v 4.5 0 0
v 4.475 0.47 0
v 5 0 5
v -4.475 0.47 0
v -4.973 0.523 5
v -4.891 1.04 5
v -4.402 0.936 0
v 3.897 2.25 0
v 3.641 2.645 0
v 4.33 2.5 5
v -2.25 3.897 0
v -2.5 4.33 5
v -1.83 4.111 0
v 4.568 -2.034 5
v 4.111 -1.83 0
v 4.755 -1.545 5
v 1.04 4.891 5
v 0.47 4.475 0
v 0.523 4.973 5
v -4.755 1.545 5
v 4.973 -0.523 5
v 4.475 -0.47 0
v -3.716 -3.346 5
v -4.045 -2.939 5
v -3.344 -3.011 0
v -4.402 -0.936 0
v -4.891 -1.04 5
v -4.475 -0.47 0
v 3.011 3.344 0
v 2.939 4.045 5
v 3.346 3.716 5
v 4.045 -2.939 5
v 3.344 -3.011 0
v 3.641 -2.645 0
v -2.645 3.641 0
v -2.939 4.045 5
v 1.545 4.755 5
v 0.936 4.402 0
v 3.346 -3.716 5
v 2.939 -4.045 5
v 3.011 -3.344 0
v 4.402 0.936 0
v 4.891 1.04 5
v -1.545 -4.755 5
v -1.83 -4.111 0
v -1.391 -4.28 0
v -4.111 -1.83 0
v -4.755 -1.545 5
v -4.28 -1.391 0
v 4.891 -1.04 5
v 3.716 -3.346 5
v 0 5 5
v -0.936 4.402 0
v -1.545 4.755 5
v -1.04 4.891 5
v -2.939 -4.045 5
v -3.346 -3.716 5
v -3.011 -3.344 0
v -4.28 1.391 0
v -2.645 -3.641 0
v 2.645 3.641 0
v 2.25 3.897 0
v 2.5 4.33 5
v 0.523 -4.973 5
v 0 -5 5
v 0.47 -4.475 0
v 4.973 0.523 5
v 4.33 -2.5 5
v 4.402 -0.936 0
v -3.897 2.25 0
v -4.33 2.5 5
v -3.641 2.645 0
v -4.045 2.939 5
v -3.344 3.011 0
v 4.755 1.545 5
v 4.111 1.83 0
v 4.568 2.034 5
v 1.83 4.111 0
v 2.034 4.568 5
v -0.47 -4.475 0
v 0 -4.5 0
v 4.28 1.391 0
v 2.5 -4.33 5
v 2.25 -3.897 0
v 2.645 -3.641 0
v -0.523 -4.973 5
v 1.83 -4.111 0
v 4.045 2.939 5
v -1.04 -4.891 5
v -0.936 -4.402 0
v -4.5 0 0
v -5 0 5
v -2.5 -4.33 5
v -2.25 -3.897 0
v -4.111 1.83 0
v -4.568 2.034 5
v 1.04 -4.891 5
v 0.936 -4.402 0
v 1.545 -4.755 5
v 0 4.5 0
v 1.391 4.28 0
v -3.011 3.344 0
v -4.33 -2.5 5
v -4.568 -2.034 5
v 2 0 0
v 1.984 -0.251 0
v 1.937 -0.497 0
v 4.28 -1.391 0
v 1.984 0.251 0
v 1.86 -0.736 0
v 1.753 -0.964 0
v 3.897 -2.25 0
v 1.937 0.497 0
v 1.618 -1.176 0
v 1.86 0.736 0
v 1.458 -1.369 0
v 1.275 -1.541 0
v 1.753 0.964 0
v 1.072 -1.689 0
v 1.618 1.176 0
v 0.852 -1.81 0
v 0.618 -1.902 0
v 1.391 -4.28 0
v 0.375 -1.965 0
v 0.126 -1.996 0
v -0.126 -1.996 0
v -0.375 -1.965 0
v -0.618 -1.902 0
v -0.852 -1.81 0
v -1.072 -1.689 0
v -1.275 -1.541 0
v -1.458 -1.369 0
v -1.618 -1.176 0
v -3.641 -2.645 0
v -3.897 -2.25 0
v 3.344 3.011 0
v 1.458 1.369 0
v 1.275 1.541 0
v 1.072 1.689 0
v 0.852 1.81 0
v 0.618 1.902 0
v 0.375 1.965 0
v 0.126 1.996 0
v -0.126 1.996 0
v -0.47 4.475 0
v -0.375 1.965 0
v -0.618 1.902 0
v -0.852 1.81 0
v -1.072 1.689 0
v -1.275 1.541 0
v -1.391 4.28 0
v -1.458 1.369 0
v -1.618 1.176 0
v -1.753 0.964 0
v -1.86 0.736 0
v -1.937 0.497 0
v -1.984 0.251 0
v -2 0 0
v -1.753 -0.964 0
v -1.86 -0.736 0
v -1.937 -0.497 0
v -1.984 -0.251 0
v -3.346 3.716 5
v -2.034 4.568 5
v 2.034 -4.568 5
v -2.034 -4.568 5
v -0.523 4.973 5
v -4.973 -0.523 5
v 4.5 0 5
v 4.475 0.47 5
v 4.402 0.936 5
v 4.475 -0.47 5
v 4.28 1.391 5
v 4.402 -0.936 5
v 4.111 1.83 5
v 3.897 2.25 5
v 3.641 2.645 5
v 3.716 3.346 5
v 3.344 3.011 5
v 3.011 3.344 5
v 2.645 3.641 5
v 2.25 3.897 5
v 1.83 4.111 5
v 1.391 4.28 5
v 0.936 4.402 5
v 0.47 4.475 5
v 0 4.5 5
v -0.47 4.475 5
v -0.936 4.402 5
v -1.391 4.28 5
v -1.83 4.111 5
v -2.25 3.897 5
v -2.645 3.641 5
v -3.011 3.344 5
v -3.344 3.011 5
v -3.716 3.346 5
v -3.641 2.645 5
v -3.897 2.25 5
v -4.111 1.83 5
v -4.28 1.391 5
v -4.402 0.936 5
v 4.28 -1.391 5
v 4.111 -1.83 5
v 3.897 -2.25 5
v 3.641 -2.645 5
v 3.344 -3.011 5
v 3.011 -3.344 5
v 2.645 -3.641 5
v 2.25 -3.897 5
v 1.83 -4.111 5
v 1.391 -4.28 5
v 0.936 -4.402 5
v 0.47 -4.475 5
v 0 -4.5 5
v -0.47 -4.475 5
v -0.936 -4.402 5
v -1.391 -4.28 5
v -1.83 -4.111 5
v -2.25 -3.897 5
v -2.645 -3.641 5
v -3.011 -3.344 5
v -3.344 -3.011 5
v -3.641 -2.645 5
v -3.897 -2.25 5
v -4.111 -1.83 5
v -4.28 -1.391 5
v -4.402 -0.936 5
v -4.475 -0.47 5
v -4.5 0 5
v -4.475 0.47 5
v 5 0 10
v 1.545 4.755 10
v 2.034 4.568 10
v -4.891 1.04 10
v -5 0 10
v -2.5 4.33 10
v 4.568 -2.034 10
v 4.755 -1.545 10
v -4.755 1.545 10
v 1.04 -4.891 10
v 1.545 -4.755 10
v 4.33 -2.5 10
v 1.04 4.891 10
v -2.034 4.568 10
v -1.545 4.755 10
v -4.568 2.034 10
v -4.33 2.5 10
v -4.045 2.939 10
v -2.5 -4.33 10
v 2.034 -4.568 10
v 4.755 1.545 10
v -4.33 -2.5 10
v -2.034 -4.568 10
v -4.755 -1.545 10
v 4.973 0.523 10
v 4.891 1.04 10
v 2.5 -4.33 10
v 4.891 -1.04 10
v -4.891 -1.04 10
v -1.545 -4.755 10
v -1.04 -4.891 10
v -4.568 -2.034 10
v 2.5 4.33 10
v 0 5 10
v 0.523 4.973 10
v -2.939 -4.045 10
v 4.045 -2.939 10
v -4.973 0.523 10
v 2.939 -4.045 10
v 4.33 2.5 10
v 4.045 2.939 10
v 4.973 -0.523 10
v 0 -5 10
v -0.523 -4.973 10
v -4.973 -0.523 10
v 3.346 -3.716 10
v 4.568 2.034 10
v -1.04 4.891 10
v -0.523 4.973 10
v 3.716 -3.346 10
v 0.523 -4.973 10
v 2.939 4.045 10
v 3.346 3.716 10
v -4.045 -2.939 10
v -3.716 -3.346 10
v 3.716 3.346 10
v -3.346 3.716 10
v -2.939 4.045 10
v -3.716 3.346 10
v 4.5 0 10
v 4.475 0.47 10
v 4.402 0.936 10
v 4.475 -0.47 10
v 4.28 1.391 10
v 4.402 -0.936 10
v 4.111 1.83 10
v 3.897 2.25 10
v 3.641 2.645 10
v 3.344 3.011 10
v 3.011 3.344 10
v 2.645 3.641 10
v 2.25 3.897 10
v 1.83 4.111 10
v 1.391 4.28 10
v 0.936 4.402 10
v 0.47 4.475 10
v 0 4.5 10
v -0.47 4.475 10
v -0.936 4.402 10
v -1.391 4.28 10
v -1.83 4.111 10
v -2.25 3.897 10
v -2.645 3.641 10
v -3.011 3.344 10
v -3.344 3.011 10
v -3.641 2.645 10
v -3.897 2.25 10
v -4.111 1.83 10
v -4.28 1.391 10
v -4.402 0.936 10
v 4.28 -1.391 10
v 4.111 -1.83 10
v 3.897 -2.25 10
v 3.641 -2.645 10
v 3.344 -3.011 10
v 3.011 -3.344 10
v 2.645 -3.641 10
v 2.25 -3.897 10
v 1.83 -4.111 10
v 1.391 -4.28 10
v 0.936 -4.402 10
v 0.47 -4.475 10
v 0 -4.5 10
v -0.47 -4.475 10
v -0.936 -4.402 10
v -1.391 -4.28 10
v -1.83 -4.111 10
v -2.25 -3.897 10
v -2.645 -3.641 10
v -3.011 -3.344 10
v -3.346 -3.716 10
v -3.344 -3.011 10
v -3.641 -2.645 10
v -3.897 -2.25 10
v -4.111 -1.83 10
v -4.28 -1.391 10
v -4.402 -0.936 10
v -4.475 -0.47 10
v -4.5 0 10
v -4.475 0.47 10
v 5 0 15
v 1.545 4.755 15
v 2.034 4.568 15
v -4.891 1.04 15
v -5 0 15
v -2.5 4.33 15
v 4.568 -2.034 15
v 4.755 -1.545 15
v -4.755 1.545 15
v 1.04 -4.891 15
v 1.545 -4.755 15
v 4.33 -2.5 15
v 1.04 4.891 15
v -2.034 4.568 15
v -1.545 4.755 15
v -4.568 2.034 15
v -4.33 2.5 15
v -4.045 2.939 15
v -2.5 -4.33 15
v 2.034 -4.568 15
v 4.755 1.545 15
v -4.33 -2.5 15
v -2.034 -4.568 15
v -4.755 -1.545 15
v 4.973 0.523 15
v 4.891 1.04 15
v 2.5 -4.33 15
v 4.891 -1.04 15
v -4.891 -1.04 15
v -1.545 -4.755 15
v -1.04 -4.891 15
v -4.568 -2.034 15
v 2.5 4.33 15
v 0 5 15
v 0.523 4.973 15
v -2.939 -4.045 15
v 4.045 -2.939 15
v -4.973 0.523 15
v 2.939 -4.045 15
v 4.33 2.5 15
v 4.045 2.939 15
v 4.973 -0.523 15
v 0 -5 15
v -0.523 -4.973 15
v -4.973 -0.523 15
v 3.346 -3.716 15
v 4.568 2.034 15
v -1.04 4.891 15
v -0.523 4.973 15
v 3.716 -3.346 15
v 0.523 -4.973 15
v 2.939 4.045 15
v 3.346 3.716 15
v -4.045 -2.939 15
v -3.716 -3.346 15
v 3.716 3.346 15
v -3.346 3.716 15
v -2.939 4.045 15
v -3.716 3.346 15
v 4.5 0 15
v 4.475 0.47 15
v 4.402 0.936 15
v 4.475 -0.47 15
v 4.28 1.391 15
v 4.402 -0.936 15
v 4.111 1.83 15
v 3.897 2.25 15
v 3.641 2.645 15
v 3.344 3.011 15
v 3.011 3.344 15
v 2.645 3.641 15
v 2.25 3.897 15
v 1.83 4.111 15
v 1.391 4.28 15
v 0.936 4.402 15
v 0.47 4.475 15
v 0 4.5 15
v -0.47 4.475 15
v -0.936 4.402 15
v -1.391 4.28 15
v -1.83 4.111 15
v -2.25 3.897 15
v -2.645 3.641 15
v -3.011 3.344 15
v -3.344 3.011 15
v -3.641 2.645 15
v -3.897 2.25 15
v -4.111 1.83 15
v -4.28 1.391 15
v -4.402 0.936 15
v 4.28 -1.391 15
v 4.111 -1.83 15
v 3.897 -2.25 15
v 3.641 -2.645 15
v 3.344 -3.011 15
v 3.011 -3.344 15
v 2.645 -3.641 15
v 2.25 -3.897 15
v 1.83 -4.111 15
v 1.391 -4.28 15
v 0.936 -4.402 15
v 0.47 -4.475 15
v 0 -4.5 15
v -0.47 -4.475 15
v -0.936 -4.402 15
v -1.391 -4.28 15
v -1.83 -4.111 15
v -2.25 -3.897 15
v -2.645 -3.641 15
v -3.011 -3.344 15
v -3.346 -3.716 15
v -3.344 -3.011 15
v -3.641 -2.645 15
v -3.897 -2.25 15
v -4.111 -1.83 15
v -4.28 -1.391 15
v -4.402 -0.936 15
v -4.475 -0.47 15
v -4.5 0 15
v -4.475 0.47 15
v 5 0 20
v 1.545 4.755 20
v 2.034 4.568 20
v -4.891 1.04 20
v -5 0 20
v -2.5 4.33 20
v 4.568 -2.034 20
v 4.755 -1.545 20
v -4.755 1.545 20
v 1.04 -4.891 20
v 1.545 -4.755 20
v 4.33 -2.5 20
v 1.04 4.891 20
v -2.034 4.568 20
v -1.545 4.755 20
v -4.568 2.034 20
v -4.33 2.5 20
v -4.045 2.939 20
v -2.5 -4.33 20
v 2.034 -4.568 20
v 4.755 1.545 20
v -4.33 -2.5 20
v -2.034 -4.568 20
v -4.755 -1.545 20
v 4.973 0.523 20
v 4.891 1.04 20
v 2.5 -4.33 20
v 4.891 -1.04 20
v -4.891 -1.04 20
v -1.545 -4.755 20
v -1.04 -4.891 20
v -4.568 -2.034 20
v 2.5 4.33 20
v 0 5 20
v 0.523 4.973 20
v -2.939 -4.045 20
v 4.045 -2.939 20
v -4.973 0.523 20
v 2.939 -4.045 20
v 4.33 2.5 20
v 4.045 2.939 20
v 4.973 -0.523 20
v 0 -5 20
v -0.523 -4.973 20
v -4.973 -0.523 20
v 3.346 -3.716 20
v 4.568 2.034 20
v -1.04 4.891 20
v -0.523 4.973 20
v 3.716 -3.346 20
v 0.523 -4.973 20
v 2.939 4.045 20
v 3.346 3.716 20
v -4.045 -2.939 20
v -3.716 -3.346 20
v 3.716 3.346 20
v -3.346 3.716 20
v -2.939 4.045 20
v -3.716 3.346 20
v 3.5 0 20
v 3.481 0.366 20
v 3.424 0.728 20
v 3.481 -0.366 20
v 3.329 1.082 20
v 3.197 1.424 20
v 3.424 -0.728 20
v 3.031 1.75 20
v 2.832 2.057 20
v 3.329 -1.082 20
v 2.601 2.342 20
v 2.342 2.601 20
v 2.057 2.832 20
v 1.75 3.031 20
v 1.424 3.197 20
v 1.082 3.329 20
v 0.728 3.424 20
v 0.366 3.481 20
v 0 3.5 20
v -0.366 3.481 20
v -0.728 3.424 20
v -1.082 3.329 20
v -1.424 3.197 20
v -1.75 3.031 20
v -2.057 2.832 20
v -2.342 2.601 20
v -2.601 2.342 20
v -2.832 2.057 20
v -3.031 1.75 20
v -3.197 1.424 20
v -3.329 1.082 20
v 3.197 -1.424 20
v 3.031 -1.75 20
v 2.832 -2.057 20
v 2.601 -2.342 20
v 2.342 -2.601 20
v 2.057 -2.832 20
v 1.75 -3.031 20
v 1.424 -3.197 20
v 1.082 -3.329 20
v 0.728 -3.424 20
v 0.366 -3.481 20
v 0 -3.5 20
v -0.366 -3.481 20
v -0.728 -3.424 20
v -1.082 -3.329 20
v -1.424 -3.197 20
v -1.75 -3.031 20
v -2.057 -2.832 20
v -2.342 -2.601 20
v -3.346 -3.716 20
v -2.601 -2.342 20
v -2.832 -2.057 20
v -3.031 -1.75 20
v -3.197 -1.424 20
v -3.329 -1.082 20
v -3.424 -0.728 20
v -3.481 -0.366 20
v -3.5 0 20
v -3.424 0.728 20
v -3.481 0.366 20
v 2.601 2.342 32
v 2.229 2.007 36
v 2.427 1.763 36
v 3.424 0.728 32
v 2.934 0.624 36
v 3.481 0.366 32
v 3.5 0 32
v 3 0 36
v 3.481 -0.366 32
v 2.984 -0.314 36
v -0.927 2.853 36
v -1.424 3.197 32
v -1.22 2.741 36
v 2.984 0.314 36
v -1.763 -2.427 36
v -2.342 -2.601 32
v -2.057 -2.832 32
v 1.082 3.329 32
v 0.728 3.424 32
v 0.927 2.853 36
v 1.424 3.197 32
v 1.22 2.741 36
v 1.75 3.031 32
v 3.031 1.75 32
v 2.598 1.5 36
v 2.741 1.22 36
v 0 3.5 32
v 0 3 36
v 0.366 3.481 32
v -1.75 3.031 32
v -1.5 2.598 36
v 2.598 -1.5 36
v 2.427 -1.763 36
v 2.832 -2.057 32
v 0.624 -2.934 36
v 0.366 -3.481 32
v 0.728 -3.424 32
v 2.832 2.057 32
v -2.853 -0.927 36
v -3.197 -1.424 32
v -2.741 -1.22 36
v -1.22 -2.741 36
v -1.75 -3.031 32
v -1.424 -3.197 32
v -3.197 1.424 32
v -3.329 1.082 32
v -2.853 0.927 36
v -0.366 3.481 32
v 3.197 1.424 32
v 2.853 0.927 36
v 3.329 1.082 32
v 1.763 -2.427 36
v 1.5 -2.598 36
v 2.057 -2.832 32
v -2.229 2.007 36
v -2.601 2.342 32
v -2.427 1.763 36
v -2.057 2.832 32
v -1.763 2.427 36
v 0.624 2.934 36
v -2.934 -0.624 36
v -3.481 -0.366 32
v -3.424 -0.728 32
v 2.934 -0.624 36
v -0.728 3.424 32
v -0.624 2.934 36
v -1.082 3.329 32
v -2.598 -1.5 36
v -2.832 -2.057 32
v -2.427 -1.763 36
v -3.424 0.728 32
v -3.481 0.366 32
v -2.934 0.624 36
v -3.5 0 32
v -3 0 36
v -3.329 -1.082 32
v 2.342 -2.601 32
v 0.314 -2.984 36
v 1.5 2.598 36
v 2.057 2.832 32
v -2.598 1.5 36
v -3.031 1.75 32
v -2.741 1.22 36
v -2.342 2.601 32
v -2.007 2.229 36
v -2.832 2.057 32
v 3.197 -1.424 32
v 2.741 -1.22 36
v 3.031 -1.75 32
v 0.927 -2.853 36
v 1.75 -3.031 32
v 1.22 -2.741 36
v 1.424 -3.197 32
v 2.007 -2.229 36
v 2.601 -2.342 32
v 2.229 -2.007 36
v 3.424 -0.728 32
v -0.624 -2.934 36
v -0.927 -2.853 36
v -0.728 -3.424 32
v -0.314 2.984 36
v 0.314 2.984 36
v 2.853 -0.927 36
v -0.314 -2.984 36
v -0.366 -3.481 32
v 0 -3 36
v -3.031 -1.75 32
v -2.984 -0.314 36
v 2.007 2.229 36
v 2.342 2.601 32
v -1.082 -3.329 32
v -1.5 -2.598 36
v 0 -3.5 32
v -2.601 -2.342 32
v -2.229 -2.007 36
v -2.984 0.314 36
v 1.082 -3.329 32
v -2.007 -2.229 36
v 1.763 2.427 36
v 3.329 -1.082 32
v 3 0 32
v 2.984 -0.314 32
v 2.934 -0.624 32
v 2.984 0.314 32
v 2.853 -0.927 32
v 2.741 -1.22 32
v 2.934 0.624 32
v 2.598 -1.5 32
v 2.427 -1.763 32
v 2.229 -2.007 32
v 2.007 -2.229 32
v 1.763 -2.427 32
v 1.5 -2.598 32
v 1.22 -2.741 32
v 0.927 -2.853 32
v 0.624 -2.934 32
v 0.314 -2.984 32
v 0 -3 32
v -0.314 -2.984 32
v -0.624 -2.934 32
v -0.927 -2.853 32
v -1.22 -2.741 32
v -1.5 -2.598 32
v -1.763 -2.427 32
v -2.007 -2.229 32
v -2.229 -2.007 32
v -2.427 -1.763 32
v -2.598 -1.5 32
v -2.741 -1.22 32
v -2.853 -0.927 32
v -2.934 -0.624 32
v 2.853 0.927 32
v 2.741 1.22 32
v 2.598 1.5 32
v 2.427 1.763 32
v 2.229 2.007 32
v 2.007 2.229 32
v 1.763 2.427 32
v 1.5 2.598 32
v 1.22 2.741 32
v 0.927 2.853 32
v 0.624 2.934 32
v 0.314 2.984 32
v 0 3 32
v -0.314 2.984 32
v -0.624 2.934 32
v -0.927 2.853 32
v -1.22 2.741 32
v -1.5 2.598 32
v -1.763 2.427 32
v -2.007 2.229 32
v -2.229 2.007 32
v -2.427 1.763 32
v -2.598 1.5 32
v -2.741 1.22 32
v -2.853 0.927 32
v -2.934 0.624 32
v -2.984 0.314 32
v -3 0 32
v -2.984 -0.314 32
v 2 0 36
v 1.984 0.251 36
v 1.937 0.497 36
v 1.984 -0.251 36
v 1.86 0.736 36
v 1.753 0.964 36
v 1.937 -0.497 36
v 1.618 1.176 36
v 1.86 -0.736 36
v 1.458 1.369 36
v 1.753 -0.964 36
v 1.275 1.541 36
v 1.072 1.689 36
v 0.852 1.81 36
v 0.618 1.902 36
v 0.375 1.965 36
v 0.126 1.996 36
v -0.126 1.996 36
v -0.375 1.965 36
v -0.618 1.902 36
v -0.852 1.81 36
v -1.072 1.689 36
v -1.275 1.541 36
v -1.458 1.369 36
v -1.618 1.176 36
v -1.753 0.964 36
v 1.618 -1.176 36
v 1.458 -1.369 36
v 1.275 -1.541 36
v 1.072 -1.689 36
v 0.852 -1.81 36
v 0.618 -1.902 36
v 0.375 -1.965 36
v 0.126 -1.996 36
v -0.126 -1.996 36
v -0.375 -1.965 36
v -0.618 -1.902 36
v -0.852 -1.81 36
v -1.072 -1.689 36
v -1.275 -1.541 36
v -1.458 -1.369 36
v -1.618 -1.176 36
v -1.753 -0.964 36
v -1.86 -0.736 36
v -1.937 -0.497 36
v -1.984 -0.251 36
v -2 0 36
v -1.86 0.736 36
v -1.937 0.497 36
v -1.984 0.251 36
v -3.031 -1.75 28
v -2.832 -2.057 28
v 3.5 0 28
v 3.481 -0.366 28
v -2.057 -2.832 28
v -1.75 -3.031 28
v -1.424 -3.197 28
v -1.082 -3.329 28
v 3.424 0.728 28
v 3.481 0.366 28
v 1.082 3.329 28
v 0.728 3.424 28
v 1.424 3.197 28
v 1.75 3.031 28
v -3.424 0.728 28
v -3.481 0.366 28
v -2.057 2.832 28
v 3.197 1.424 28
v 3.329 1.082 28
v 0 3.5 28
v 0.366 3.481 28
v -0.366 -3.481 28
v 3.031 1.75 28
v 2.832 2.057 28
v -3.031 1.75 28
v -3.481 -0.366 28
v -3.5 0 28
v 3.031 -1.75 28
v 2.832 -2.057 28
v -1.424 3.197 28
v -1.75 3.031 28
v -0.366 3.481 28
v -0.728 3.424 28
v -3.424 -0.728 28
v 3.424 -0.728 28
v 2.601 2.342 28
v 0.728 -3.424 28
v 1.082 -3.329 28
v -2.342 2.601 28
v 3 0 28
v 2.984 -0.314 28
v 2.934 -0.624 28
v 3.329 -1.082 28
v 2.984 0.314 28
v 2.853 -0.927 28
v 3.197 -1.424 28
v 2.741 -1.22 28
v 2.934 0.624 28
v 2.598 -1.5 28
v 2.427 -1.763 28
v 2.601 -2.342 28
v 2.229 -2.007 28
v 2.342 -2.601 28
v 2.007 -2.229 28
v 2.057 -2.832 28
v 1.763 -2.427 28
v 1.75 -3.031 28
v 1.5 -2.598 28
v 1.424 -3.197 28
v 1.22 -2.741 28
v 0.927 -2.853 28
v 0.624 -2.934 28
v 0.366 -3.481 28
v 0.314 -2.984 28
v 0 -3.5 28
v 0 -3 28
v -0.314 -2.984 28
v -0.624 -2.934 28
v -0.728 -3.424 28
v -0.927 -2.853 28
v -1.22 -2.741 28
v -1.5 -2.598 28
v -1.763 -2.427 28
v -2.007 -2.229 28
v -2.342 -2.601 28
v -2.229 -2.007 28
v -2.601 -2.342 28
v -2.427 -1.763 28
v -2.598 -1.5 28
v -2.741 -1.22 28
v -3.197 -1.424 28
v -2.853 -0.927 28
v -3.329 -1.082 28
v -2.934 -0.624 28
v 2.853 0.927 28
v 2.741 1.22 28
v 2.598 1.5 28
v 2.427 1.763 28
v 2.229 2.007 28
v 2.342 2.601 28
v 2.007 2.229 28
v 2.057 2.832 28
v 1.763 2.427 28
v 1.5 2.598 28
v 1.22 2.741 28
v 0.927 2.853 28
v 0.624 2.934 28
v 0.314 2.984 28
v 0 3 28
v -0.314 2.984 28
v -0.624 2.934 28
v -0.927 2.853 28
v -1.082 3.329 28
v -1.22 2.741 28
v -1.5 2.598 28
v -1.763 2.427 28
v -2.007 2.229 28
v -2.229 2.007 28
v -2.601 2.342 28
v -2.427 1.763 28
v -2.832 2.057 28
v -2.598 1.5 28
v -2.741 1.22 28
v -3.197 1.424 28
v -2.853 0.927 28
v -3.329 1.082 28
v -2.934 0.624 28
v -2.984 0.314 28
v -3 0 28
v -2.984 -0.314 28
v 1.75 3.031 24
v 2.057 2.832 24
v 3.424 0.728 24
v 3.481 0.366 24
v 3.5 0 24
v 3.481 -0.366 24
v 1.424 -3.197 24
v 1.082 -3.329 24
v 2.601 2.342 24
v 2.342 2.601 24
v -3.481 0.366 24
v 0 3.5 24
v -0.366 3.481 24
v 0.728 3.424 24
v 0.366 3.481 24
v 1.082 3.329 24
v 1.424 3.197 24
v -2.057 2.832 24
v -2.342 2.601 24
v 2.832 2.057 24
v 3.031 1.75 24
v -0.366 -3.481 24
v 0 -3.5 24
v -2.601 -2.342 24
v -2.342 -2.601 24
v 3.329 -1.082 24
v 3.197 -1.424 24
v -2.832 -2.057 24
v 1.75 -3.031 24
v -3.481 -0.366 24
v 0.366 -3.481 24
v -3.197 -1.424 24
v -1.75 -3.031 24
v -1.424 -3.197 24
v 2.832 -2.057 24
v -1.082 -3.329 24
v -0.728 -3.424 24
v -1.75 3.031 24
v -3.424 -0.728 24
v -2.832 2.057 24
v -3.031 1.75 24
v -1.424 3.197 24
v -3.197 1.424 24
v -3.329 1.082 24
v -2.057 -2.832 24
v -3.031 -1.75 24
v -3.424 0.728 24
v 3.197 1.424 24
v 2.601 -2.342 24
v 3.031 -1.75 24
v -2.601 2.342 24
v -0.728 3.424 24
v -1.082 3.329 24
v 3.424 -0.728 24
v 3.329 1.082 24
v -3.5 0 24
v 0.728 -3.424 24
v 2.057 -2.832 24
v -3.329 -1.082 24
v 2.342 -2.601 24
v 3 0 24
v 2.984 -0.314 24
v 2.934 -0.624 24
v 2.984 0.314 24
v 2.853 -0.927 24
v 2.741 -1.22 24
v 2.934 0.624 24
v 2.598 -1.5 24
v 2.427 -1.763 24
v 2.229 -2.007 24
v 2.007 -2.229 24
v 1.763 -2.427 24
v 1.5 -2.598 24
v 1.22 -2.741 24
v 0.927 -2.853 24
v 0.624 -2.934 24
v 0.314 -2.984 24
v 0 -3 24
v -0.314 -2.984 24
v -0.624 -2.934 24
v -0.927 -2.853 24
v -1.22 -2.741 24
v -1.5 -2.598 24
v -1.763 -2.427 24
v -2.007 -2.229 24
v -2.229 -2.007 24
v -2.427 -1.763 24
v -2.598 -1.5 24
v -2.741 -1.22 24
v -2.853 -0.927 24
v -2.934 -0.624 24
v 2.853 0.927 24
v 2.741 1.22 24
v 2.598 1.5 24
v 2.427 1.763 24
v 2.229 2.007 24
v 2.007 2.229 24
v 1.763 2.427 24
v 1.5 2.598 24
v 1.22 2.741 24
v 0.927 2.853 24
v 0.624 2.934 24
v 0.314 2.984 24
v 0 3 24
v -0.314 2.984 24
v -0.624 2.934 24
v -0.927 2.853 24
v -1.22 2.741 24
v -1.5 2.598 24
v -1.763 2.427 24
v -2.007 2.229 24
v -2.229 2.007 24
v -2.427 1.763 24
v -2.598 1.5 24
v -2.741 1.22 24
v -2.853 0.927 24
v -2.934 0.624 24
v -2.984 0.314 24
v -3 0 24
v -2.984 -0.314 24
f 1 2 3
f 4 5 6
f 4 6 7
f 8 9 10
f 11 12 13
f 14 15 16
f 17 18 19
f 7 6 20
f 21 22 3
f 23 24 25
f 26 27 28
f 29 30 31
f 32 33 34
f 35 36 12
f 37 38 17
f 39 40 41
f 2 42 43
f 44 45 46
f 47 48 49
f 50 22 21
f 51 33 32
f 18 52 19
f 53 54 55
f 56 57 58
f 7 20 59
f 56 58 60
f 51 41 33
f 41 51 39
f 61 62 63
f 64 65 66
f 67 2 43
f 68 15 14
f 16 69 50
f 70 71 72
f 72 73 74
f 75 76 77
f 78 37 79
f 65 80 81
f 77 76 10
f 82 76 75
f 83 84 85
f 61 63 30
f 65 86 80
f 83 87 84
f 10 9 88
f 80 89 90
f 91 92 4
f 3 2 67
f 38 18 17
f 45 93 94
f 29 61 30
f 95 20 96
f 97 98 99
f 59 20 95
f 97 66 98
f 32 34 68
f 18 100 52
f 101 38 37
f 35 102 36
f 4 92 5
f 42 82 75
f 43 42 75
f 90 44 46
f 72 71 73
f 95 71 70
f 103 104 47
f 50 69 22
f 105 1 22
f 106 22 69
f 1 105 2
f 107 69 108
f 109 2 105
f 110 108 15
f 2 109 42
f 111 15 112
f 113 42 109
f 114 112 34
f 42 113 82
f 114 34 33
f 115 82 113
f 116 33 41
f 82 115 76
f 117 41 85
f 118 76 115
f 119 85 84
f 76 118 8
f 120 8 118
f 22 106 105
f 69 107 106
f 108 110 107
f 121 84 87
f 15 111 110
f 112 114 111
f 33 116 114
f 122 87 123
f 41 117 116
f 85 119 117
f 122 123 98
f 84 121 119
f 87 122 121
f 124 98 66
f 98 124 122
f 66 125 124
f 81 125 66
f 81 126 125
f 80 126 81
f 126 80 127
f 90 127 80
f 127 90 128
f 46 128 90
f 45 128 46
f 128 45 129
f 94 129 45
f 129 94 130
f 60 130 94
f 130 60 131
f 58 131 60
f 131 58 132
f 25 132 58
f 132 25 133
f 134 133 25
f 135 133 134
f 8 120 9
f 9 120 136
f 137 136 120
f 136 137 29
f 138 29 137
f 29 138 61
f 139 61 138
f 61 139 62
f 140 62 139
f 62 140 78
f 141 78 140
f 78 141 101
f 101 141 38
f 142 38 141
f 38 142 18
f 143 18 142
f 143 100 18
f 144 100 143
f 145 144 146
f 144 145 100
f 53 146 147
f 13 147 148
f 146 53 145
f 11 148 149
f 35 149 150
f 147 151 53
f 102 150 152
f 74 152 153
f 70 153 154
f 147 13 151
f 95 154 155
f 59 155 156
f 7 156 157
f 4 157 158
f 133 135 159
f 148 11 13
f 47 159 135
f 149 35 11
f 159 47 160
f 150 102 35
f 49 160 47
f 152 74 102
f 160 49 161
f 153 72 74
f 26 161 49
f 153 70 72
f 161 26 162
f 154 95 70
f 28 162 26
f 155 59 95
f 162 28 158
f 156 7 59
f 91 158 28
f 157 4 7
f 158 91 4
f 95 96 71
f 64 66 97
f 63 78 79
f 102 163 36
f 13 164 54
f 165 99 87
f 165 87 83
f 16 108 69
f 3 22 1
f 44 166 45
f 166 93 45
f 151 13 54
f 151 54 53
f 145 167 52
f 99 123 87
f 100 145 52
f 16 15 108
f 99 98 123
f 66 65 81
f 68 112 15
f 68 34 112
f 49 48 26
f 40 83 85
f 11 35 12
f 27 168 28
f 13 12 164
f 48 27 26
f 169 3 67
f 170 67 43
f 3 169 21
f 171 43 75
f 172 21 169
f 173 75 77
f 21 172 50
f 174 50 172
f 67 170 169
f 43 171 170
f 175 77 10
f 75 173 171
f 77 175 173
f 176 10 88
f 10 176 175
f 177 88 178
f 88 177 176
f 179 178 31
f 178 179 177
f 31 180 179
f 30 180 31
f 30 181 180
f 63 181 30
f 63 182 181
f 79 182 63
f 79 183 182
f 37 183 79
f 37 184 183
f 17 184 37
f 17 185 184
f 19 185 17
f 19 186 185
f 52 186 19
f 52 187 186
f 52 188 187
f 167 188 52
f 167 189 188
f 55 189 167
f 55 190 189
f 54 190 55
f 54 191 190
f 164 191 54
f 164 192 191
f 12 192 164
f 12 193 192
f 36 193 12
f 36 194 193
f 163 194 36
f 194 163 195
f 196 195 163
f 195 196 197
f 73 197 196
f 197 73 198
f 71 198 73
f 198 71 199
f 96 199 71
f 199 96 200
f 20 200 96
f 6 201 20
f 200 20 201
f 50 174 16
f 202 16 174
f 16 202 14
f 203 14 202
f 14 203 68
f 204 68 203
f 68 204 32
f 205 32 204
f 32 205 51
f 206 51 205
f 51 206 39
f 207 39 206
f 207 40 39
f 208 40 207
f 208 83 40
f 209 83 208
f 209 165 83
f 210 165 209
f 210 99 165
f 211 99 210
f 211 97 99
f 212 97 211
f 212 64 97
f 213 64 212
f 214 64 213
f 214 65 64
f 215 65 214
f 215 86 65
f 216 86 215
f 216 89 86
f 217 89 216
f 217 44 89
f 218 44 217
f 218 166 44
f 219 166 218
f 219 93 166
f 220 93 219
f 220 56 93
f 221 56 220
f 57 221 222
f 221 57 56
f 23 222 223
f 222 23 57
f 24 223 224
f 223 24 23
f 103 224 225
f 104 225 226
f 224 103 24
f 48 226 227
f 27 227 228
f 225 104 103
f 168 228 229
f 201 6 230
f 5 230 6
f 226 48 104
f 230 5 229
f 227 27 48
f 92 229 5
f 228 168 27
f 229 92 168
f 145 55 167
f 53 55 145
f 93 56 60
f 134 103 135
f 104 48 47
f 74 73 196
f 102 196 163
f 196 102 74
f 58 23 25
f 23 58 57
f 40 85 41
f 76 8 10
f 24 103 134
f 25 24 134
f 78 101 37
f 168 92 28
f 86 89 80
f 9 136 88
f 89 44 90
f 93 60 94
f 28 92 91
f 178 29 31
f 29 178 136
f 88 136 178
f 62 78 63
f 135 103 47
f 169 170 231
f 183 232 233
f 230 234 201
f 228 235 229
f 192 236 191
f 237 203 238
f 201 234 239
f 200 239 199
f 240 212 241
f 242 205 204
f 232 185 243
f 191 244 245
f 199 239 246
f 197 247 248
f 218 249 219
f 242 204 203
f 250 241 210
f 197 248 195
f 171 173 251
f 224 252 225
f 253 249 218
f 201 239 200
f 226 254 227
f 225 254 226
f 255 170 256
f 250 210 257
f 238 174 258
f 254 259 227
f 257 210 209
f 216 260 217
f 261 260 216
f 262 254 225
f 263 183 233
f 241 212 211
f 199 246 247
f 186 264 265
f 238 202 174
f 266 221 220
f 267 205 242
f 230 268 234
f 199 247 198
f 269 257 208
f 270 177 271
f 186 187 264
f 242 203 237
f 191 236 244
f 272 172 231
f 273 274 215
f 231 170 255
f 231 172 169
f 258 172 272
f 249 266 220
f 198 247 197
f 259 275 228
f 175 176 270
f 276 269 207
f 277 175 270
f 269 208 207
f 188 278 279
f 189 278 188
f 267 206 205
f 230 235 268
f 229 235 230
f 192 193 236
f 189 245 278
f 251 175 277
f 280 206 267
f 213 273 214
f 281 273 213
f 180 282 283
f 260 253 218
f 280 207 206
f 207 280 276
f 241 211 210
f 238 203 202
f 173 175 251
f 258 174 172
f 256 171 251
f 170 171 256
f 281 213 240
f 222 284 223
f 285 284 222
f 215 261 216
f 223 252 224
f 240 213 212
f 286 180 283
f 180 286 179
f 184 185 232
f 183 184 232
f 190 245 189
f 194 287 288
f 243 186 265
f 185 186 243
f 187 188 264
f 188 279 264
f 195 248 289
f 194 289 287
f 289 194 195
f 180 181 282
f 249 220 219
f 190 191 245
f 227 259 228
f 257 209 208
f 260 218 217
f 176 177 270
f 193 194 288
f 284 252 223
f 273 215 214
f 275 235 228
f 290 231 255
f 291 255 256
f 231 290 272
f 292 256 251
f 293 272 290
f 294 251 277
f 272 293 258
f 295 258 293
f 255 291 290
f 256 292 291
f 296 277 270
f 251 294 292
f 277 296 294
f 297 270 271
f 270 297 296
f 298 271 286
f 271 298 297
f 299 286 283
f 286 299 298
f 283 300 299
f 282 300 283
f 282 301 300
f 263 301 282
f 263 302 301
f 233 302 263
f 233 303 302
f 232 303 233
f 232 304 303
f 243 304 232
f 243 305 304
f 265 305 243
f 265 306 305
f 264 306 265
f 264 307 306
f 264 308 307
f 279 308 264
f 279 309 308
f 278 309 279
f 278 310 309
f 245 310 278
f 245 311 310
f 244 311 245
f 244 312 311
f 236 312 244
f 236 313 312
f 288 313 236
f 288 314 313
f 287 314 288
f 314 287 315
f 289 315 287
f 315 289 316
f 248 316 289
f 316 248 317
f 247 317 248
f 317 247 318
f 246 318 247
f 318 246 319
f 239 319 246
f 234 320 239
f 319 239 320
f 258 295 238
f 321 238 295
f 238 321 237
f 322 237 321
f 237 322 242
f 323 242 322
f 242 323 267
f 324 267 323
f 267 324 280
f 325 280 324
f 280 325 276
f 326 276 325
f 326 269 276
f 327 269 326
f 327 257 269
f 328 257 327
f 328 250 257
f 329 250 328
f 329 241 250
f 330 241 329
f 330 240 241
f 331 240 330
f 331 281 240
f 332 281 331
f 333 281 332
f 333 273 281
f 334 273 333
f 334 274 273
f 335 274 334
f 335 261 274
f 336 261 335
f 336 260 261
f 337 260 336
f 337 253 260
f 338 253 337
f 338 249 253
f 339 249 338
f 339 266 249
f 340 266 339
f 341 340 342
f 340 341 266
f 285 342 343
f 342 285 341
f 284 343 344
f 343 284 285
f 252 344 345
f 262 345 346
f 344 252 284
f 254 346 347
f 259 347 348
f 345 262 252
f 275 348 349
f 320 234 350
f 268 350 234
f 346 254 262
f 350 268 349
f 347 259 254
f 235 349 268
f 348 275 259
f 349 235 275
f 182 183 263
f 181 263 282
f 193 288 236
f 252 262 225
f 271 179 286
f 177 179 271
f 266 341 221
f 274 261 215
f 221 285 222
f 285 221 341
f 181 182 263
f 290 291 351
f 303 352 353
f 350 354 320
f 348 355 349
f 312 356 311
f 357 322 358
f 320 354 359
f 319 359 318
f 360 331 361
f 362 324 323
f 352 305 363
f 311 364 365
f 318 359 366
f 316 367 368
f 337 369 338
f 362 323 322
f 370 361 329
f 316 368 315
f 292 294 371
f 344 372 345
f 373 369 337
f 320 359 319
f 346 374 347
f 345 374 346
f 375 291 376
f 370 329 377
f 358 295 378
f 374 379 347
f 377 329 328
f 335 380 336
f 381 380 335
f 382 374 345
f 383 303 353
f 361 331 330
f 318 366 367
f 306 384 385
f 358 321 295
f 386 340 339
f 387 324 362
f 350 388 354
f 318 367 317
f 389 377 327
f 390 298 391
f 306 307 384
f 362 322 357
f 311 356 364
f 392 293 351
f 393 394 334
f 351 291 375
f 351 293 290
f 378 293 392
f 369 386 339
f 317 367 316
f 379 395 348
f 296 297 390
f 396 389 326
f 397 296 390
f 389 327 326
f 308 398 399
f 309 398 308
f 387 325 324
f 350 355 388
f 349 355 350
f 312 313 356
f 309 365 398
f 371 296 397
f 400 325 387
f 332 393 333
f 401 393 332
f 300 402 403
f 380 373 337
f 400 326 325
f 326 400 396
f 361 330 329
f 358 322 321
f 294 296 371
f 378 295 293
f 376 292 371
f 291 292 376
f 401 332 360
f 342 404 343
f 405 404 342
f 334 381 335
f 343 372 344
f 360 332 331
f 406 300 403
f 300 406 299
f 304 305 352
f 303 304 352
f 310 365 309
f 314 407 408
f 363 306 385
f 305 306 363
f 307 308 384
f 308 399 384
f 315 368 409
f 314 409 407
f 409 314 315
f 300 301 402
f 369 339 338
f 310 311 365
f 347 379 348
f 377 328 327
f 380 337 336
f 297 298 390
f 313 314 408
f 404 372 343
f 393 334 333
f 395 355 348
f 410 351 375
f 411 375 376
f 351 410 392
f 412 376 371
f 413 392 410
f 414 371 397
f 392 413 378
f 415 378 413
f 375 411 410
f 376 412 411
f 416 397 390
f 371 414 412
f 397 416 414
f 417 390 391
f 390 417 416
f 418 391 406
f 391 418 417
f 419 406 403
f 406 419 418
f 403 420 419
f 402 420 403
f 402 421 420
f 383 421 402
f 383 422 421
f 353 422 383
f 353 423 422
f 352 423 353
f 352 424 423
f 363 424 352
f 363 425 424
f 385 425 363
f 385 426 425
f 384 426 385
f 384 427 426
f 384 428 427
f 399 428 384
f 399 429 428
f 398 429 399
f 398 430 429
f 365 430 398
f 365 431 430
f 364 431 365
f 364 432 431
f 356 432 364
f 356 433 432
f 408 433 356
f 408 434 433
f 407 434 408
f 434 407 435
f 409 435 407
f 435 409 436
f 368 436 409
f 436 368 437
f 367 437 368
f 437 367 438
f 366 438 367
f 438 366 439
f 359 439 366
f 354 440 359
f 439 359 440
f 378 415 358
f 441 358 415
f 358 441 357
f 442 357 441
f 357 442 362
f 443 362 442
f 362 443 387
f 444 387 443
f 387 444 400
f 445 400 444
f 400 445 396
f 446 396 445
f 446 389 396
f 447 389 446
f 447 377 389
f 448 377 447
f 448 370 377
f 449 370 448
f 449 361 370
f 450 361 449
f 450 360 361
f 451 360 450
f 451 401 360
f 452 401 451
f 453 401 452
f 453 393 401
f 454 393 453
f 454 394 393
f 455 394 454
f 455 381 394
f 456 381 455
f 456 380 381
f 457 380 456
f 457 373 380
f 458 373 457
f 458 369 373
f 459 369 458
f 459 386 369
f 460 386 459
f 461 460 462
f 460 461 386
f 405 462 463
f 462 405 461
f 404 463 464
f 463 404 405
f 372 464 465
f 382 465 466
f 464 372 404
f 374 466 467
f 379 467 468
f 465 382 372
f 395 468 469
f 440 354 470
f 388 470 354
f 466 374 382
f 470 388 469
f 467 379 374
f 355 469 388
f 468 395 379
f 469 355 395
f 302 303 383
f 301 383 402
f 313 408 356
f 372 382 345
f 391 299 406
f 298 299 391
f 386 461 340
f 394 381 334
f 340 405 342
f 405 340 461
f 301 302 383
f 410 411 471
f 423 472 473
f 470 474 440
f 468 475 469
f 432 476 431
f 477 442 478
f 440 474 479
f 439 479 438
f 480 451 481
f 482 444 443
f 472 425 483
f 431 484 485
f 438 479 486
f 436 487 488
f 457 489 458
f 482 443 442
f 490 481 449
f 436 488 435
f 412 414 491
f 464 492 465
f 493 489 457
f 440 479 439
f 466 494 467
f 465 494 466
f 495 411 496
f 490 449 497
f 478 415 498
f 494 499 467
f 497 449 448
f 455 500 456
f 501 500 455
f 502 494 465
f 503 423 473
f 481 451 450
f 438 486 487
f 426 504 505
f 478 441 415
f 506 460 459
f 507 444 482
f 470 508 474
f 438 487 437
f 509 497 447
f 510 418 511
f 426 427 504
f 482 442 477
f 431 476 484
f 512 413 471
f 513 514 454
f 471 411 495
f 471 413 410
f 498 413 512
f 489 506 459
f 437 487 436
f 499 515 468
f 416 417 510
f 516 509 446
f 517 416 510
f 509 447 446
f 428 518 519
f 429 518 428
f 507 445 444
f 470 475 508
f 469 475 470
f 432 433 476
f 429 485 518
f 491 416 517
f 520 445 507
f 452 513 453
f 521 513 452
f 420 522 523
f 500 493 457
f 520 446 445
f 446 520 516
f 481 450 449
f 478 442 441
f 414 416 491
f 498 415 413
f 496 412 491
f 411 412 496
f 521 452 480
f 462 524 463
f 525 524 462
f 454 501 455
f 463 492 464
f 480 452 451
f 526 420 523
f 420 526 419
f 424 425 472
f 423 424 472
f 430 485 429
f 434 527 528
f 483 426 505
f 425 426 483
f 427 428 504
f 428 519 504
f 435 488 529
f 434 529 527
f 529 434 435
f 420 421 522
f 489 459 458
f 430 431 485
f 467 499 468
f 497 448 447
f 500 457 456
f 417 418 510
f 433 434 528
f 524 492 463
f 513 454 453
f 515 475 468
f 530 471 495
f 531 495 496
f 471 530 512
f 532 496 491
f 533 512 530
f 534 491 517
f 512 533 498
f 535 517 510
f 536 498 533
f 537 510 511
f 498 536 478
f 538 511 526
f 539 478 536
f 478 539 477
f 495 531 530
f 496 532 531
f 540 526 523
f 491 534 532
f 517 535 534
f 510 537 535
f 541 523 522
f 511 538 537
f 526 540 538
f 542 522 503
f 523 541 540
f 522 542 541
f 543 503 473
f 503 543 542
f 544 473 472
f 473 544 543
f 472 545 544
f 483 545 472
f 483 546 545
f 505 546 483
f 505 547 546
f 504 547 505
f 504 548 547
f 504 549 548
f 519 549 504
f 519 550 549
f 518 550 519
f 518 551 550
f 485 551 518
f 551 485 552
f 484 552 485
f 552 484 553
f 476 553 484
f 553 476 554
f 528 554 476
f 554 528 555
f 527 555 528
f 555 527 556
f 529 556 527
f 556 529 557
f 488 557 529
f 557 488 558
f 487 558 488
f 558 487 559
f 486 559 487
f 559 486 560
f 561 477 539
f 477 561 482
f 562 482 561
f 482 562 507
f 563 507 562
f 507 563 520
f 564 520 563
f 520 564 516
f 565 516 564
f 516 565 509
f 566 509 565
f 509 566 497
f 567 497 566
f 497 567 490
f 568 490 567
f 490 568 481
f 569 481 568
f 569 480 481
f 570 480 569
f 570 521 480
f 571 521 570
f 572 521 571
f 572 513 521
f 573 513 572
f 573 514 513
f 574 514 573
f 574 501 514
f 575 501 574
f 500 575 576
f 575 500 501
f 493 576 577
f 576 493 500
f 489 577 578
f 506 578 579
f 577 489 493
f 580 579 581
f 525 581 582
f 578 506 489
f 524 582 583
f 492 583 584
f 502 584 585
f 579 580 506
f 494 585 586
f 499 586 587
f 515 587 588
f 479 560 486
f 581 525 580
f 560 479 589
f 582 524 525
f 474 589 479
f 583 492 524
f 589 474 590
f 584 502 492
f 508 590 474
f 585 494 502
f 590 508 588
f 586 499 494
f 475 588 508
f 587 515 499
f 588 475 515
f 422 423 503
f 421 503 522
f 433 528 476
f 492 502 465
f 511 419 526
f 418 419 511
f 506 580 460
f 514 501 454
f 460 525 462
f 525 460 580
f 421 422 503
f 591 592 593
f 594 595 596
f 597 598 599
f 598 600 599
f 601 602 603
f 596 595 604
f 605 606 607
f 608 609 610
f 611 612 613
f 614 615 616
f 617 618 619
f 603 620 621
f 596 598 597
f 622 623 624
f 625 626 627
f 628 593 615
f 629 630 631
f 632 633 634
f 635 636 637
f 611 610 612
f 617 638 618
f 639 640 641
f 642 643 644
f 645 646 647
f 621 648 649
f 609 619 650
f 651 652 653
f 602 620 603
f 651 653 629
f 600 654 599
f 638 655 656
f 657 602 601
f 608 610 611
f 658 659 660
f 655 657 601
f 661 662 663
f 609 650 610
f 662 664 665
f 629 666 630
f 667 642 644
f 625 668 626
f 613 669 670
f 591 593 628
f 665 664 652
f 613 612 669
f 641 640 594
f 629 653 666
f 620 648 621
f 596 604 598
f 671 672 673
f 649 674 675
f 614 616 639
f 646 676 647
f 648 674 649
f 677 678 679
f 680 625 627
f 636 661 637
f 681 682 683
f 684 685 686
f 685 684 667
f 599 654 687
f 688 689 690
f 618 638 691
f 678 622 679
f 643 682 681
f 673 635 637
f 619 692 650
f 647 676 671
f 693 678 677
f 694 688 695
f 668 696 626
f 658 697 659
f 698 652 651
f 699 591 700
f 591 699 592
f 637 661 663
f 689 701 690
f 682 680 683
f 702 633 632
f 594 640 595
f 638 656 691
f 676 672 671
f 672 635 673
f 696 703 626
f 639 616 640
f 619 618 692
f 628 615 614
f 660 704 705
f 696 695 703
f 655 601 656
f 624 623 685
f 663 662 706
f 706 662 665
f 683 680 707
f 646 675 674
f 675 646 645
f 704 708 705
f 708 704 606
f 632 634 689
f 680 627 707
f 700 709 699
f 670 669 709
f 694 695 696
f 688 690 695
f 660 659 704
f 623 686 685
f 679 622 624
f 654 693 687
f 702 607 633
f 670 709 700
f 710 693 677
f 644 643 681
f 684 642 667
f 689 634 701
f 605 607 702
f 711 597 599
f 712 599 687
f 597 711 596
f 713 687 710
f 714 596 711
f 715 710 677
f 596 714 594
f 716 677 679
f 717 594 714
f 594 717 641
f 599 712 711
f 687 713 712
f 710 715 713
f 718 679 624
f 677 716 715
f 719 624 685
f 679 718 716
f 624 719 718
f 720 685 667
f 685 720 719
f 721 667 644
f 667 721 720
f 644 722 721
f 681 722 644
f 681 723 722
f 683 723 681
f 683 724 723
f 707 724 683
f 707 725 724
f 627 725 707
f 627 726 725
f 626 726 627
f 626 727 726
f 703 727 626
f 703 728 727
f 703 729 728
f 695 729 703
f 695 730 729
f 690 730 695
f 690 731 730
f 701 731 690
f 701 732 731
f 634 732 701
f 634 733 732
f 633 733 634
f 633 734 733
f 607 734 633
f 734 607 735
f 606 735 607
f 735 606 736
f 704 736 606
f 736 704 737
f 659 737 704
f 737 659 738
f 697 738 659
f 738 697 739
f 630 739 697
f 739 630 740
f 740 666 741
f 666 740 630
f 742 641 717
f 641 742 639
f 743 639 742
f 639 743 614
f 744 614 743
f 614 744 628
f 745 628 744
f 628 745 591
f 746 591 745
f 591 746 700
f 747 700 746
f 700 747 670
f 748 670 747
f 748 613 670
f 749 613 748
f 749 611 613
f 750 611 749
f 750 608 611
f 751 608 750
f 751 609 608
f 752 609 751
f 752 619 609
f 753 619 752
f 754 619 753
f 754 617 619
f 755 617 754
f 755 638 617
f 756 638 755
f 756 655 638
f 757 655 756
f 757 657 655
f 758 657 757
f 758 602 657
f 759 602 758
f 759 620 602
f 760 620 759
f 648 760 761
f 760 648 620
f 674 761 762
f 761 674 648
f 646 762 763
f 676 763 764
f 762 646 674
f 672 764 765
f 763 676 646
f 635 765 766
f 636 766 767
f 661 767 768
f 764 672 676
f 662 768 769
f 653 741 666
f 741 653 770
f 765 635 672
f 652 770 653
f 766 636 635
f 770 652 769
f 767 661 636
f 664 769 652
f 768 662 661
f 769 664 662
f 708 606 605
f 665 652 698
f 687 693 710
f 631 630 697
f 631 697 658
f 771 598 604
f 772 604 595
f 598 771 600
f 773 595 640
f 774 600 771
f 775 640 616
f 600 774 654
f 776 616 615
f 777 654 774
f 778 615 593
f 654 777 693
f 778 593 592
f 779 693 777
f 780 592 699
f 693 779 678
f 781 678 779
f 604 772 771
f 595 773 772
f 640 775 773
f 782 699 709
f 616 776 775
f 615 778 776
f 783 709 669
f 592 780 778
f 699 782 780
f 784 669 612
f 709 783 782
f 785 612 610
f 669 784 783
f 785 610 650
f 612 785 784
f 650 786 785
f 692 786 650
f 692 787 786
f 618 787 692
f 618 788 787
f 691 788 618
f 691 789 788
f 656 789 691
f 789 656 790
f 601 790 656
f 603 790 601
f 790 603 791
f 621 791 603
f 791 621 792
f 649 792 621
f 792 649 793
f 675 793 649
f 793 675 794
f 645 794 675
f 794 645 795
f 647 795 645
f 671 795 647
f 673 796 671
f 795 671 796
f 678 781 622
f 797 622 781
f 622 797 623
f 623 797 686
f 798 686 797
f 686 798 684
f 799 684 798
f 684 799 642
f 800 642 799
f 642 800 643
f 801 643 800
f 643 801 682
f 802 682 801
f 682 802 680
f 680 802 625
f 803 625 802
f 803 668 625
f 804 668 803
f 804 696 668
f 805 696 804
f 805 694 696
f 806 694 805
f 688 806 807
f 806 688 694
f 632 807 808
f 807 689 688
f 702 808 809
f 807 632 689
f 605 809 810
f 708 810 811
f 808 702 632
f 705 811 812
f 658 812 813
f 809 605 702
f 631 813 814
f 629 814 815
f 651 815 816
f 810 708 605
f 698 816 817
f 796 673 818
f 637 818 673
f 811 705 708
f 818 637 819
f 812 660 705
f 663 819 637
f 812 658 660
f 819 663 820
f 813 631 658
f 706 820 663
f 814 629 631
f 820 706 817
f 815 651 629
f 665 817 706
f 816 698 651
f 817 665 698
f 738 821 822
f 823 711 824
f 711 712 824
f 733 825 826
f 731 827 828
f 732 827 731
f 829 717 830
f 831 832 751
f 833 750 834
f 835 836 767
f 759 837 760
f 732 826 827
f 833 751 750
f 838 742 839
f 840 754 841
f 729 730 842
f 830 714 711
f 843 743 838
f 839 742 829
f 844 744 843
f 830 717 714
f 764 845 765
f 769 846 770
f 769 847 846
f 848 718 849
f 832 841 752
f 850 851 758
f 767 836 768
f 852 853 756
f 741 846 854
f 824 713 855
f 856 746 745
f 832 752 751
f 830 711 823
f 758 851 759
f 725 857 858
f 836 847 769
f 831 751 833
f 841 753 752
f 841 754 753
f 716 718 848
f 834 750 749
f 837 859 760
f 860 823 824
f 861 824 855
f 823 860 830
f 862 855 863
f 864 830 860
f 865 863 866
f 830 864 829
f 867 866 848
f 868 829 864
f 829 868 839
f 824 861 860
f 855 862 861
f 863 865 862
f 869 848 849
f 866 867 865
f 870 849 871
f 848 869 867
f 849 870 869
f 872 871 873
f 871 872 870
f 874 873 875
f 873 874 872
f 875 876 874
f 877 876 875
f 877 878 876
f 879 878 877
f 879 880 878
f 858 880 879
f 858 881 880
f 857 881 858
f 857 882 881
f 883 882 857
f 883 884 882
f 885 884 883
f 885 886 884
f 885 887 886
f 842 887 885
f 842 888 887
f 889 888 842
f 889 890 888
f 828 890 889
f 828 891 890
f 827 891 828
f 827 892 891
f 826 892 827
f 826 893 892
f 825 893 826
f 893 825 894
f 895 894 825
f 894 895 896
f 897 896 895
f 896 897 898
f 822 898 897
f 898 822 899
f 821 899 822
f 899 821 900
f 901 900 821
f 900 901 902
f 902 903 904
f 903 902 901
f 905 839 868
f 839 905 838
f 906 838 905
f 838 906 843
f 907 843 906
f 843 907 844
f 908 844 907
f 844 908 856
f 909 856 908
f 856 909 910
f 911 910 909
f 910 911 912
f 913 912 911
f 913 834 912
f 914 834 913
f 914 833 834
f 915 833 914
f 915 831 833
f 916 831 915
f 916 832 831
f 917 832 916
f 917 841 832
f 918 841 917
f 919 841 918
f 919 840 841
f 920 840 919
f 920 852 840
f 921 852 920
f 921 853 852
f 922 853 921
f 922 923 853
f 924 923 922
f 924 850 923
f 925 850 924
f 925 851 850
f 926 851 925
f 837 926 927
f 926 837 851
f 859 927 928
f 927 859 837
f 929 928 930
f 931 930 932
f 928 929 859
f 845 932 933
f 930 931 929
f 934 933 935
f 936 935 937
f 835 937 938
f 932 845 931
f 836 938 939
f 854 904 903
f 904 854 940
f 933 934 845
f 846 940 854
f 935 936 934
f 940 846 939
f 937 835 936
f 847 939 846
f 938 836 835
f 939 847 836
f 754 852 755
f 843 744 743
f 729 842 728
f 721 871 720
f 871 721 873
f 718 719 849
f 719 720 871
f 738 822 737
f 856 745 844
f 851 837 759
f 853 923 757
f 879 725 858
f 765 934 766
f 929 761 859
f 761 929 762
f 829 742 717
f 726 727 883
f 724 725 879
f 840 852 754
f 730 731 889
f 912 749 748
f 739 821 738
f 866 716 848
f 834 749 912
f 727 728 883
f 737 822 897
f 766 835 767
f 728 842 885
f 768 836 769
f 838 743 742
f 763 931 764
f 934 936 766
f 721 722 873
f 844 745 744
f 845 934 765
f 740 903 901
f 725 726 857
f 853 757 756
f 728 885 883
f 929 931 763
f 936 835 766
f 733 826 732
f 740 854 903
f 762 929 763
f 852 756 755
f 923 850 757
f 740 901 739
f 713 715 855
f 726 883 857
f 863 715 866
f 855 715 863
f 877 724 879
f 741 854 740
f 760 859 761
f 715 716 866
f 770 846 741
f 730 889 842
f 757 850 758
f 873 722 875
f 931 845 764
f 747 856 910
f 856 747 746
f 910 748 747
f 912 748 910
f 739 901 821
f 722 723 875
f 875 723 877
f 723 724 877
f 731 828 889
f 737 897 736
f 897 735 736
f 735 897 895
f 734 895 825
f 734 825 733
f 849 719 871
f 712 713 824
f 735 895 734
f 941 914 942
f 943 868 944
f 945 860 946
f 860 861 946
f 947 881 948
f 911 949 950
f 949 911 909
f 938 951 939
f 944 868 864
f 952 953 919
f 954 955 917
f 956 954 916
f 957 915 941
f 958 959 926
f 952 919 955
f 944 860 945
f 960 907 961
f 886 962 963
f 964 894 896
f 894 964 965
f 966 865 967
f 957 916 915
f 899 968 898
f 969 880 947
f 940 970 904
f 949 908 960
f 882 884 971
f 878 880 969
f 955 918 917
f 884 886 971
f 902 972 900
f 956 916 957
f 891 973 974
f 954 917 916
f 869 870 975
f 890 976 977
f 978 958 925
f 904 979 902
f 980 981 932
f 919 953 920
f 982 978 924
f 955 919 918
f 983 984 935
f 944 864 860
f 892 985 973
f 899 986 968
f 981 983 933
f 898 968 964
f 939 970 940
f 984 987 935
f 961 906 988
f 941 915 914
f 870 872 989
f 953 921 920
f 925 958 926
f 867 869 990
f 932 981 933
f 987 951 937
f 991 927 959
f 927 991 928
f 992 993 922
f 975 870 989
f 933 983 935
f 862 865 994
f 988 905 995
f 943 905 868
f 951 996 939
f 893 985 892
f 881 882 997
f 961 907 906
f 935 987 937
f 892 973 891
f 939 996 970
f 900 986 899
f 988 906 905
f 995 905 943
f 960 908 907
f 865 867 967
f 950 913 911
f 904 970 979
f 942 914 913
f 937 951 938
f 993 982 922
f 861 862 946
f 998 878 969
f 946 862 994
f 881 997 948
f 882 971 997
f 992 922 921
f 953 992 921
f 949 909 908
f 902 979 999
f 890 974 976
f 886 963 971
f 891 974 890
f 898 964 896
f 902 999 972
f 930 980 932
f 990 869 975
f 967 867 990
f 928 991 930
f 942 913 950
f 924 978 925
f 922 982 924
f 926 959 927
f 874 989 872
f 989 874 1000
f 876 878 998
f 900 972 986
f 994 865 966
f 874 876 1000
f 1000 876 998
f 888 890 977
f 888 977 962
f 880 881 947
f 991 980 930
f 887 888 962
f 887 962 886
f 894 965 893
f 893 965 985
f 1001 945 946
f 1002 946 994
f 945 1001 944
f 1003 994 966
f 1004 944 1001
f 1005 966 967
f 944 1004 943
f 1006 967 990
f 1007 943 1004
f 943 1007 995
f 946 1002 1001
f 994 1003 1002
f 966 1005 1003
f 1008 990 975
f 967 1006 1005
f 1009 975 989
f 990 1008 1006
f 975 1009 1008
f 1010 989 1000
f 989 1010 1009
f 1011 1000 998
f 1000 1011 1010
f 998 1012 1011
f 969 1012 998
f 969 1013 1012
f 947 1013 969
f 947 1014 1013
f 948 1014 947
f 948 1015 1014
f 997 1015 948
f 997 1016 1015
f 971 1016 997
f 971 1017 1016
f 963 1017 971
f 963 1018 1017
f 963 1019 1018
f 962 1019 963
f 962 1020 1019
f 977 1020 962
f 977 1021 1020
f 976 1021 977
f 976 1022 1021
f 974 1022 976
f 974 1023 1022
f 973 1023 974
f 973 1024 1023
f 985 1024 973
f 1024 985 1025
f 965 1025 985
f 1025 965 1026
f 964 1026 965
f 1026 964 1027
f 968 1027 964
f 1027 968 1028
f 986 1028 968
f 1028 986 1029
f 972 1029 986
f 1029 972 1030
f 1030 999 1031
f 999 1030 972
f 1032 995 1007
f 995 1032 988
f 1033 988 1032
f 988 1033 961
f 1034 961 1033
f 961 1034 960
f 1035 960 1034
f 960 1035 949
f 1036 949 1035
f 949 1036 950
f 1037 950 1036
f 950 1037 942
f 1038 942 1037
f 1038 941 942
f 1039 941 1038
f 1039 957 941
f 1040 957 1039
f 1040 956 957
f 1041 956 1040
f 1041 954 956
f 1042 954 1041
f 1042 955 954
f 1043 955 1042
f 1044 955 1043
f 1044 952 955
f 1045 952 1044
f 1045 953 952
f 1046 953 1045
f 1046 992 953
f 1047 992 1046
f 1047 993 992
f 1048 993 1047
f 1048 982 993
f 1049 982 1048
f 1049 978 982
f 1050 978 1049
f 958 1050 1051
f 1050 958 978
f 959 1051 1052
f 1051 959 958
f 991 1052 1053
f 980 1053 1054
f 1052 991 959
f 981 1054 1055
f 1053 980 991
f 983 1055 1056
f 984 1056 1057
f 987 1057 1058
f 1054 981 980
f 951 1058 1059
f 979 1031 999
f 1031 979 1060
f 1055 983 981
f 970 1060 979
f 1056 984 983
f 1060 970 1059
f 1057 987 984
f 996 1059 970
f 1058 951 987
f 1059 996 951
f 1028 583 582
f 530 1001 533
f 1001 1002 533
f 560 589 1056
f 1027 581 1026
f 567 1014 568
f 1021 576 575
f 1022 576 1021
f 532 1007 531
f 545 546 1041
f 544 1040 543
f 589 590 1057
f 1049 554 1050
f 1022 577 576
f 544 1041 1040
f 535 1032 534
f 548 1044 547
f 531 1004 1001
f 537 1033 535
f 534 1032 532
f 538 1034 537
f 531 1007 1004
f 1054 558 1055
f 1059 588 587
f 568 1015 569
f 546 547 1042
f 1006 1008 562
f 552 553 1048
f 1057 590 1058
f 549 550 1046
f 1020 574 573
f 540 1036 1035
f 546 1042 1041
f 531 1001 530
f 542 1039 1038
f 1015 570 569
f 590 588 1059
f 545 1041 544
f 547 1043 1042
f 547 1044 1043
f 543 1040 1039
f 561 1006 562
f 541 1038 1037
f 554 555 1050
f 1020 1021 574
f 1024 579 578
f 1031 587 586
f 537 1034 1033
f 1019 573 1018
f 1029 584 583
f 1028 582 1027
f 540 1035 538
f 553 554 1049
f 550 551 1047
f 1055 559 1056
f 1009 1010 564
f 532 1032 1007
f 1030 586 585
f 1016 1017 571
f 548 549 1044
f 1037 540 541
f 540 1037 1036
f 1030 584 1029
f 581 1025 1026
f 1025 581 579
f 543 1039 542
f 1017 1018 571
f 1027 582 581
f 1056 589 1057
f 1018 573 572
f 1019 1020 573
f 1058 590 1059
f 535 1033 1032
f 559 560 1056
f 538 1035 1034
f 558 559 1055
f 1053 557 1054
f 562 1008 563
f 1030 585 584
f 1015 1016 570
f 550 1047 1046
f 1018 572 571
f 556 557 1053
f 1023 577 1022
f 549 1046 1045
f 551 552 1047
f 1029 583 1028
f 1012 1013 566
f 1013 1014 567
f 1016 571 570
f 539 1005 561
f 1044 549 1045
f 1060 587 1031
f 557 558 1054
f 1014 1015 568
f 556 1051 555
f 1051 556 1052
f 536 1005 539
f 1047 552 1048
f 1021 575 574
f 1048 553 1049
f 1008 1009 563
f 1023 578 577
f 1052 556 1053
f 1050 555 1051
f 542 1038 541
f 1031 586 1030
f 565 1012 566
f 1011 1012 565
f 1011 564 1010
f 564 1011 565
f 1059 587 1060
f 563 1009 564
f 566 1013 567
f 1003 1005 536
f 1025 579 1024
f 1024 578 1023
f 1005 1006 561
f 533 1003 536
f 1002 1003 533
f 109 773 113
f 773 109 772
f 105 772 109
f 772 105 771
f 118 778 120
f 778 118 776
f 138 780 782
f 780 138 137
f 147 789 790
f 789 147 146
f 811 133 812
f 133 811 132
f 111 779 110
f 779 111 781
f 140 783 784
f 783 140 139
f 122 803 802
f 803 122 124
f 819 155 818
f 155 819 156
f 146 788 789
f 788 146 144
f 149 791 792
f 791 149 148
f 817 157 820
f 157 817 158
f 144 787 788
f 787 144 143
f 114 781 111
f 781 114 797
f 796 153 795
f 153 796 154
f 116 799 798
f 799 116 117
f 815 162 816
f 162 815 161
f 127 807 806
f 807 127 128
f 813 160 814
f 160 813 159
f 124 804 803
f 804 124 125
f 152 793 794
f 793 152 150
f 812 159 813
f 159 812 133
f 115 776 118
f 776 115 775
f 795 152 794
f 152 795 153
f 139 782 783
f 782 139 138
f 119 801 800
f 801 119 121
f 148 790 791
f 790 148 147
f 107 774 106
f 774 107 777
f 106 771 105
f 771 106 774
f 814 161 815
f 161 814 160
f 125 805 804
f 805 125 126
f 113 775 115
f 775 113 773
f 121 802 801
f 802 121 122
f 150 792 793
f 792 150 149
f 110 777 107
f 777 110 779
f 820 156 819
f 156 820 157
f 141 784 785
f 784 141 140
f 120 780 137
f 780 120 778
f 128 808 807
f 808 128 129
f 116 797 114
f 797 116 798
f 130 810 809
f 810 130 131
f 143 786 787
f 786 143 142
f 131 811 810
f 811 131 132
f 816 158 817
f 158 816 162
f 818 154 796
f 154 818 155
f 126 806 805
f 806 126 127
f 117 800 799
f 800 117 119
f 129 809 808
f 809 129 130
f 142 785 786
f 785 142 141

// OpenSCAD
////////////////////////////////////////////////////////////////
// PARAMETERS //////////////////////////////////////////////////


smallExtDiam = 6; // Small part exterior diameter in millimeters
smallLength = 16; // Length of the small side in millimeters

bigExtDiam = 9; // Big part exterior diameter in millimeters
bigLength = 20; // Length of the big side in millimeters

holeDiameterDifference = 2; // Hole diameter difference with small part exterior diameter

stepCount = 4; // Number of steps on each side
stepDiamIncrease = 1; // diameter increase in millimiters

tubeAdapter(smallExtDiam, smallLength, bigExtDiam, bigLength);

module tubeAdapter(smallExtDiam, smallLength, bigExtDiam, bigLength) {
  difference() {
    union() {
      oneSide(bigExtDiam, bigLength);
      translate([0, 0, smallLength + bigLength]) {
        rotate([180, 0, 0]) {
        color("red")
          oneSide(smallExtDiam, smallLength);
        }
      }
    }
    translate([0, 0, -1])
      cylinder(d = smallExtDiam - holeDiameterDifference, h=smallLength + bigLength + 2, $fn=50);
  }
}

module oneSide(diam, length) {
  stepZ = length/stepCount;
  for (step = [0 : stepCount - 1]) {
    translate([0, 0, step * stepZ]) {
      cylinder(d1 = diam, d2 = diam + stepDiamIncrease, h = stepZ, $fn=60);
    }
  }

}
